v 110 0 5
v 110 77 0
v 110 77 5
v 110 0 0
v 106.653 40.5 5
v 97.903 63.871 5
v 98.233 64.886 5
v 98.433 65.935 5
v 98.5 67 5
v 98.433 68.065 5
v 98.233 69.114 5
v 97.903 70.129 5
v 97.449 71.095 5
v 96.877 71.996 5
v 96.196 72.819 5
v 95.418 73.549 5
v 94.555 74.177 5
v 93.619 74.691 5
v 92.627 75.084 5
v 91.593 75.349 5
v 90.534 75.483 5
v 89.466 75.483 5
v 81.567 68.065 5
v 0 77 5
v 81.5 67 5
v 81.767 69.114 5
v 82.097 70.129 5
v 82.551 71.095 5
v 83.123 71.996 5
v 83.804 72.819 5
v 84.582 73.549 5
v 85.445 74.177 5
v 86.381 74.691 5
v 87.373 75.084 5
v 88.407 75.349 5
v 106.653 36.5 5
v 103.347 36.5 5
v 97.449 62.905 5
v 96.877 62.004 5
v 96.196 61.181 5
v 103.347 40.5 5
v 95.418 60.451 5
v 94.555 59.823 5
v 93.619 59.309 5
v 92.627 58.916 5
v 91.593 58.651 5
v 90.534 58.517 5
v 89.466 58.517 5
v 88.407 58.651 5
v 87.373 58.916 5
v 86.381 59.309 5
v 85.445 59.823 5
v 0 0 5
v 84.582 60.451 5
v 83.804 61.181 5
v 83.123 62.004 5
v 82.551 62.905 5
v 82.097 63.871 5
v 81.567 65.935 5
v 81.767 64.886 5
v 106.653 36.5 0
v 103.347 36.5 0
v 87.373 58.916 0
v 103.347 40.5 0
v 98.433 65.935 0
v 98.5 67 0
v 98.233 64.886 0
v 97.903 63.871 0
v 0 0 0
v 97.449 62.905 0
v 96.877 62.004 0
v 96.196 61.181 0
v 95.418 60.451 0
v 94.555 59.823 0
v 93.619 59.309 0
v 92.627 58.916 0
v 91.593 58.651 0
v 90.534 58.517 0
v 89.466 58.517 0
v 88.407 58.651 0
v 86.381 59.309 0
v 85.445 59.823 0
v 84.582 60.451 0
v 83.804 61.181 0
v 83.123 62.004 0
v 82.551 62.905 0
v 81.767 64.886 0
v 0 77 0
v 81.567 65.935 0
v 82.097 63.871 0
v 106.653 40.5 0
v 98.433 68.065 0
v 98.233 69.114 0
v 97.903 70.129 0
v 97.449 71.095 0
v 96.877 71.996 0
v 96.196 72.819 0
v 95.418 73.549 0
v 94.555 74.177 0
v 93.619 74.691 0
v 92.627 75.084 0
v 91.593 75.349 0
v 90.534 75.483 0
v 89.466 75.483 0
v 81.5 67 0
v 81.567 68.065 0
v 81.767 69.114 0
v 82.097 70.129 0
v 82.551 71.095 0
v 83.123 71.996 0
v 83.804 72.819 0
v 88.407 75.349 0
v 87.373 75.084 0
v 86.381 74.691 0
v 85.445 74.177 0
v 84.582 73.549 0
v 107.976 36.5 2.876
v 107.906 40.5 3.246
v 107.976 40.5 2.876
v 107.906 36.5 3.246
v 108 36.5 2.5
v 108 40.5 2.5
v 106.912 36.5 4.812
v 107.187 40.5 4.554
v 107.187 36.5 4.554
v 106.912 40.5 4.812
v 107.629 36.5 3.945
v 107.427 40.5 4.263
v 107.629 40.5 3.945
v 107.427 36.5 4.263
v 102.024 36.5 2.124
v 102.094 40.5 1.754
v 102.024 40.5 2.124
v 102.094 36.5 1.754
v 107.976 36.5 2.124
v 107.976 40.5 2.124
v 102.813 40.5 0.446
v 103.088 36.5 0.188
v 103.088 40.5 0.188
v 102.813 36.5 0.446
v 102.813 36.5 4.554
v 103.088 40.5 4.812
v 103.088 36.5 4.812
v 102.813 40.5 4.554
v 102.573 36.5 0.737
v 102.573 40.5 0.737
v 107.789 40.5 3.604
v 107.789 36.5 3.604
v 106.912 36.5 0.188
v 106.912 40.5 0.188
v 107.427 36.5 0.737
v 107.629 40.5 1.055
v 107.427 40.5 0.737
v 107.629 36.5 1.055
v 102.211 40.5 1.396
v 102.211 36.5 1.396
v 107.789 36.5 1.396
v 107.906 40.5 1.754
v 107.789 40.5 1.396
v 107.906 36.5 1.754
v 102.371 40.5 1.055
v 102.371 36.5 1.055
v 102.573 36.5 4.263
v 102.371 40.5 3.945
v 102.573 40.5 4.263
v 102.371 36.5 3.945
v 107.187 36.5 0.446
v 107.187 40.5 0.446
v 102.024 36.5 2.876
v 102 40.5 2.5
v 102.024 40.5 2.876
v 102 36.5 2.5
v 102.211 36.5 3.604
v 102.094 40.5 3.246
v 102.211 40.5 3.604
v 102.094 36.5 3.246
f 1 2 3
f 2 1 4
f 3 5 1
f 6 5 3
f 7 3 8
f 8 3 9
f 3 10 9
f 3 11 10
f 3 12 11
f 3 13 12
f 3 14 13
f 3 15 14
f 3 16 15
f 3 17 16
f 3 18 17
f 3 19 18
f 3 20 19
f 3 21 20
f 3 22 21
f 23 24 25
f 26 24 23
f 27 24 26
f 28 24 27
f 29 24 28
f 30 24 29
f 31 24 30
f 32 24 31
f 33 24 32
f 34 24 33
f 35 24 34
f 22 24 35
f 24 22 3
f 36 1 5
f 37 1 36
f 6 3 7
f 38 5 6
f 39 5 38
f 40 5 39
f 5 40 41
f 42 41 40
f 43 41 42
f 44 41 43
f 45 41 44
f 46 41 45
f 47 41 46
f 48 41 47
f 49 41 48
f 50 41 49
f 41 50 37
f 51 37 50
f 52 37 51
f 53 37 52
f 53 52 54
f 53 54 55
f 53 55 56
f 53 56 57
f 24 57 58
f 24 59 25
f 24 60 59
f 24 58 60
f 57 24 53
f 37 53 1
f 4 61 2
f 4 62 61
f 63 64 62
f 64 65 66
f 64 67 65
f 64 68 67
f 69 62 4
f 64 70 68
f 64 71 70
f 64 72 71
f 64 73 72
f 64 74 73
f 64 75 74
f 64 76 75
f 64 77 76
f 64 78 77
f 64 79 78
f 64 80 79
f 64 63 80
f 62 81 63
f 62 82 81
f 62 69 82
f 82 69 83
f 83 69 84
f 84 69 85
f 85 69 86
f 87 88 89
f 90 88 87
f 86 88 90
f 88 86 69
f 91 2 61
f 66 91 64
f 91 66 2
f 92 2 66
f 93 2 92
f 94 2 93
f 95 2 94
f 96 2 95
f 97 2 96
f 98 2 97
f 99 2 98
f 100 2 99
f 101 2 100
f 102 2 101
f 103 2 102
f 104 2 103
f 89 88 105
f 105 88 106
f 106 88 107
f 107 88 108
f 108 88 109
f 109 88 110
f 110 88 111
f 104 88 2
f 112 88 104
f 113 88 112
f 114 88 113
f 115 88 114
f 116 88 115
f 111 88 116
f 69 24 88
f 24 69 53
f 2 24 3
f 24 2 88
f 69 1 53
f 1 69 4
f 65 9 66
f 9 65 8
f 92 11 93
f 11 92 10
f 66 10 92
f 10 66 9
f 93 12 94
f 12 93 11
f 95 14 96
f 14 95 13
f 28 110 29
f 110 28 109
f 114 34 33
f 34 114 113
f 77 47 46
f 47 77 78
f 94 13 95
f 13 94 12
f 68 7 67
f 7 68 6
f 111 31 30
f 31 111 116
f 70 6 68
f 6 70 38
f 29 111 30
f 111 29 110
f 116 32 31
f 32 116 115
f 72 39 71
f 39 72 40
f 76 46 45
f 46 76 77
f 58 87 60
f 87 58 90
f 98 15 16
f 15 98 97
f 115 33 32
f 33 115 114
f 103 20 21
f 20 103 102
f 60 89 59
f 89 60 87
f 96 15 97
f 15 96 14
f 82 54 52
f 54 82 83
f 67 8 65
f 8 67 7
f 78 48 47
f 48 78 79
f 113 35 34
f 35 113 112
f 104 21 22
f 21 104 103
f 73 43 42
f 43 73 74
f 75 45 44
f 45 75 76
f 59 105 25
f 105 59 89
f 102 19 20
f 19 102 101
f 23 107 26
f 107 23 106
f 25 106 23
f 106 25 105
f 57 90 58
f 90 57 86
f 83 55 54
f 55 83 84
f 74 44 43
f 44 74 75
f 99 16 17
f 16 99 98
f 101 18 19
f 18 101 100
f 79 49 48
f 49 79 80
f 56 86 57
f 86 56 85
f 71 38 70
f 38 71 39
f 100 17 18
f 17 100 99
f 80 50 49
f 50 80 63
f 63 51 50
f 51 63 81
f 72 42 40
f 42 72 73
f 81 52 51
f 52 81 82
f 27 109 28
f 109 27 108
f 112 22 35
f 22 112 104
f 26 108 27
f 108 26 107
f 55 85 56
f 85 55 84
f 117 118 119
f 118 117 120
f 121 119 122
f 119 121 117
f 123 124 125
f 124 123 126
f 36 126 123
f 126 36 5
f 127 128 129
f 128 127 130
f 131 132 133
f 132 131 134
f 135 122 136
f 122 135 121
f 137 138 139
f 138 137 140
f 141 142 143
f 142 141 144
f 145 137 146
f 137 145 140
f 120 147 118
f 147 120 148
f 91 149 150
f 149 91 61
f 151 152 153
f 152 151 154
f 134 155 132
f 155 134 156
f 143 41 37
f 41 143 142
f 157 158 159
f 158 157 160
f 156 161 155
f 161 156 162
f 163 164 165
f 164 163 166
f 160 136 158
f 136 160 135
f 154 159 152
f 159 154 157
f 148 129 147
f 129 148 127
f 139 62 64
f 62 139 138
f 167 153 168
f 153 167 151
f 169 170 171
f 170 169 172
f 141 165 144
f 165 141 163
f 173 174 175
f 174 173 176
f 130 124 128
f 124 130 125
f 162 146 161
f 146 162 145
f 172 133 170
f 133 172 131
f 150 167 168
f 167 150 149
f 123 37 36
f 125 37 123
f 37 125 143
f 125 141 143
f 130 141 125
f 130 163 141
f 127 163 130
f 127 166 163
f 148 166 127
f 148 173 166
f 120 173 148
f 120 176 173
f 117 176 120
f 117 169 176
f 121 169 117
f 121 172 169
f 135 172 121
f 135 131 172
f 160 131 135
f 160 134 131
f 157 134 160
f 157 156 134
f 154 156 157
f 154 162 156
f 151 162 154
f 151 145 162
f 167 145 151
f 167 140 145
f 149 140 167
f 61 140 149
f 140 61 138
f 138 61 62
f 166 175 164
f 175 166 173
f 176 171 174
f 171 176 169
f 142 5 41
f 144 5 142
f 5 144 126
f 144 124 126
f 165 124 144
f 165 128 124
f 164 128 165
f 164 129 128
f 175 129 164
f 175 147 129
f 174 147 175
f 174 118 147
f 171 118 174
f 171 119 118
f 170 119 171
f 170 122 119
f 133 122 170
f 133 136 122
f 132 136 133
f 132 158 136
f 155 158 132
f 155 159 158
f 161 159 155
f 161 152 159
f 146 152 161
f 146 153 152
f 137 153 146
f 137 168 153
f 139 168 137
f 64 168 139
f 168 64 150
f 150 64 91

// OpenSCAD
// LID ONLY - With all required cutouts
$fn = 50; // Smoothness

// Dimensions (must match main box)
lid_length = 110;   // box_length = stm32_length + 10
lid_width = 77;     // box_width = stm32_width + 10
lid_height = 5;     // Lid thickness
wall_thickness = 2; 

// MQ7 sensor cutout
mq7_diameter = 17;  
mq7_x = 90;         // Position from left (box_length - 20)
mq7_y = 67;         // Position from front (box_width - 10)

// LoRa antenna hole
antenna_diameter = 6;
antenna_x = 105;    // box_length - 5
antenna_y = lid_width/2;

// Ventilation slots (vertical)
module ventilation_slots() {
    slot_length = 9;  // Height (vertical)
    slot_width = 2;   // Thickness
    for (i = [0:4]) {
        // Left side
        translate([-1, 7 + i*15, lid_height/2]) {
            cube([wall_thickness + 2, slot_width, slot_length], center=true);
        }
        // Right side
        translate([lid_length - wall_thickness - 1, 7 + i*15, lid_height/2]) {
            cube([wall_thickness + 2, slot_width, slot_length], center=true);
        }
    }
}

// Main lid with holes
difference() {
    // Base lid
    cube([lid_length, lid_width, lid_height]);
    
    // MQ7 sensor hole (top)
    translate([mq7_x, mq7_y, -1]) {
        cylinder(h=lid_height + 2, d=mq7_diameter);
    }
    
    // LoRa antenna hole (side)
    translate([antenna_x, antenna_y, lid_height/2]) {
        rotate([90, 0, 0]) {
            cylinder(h=wall_thickness + 2, d=antenna_diameter, center=true);
        }
    }
    
  
}
